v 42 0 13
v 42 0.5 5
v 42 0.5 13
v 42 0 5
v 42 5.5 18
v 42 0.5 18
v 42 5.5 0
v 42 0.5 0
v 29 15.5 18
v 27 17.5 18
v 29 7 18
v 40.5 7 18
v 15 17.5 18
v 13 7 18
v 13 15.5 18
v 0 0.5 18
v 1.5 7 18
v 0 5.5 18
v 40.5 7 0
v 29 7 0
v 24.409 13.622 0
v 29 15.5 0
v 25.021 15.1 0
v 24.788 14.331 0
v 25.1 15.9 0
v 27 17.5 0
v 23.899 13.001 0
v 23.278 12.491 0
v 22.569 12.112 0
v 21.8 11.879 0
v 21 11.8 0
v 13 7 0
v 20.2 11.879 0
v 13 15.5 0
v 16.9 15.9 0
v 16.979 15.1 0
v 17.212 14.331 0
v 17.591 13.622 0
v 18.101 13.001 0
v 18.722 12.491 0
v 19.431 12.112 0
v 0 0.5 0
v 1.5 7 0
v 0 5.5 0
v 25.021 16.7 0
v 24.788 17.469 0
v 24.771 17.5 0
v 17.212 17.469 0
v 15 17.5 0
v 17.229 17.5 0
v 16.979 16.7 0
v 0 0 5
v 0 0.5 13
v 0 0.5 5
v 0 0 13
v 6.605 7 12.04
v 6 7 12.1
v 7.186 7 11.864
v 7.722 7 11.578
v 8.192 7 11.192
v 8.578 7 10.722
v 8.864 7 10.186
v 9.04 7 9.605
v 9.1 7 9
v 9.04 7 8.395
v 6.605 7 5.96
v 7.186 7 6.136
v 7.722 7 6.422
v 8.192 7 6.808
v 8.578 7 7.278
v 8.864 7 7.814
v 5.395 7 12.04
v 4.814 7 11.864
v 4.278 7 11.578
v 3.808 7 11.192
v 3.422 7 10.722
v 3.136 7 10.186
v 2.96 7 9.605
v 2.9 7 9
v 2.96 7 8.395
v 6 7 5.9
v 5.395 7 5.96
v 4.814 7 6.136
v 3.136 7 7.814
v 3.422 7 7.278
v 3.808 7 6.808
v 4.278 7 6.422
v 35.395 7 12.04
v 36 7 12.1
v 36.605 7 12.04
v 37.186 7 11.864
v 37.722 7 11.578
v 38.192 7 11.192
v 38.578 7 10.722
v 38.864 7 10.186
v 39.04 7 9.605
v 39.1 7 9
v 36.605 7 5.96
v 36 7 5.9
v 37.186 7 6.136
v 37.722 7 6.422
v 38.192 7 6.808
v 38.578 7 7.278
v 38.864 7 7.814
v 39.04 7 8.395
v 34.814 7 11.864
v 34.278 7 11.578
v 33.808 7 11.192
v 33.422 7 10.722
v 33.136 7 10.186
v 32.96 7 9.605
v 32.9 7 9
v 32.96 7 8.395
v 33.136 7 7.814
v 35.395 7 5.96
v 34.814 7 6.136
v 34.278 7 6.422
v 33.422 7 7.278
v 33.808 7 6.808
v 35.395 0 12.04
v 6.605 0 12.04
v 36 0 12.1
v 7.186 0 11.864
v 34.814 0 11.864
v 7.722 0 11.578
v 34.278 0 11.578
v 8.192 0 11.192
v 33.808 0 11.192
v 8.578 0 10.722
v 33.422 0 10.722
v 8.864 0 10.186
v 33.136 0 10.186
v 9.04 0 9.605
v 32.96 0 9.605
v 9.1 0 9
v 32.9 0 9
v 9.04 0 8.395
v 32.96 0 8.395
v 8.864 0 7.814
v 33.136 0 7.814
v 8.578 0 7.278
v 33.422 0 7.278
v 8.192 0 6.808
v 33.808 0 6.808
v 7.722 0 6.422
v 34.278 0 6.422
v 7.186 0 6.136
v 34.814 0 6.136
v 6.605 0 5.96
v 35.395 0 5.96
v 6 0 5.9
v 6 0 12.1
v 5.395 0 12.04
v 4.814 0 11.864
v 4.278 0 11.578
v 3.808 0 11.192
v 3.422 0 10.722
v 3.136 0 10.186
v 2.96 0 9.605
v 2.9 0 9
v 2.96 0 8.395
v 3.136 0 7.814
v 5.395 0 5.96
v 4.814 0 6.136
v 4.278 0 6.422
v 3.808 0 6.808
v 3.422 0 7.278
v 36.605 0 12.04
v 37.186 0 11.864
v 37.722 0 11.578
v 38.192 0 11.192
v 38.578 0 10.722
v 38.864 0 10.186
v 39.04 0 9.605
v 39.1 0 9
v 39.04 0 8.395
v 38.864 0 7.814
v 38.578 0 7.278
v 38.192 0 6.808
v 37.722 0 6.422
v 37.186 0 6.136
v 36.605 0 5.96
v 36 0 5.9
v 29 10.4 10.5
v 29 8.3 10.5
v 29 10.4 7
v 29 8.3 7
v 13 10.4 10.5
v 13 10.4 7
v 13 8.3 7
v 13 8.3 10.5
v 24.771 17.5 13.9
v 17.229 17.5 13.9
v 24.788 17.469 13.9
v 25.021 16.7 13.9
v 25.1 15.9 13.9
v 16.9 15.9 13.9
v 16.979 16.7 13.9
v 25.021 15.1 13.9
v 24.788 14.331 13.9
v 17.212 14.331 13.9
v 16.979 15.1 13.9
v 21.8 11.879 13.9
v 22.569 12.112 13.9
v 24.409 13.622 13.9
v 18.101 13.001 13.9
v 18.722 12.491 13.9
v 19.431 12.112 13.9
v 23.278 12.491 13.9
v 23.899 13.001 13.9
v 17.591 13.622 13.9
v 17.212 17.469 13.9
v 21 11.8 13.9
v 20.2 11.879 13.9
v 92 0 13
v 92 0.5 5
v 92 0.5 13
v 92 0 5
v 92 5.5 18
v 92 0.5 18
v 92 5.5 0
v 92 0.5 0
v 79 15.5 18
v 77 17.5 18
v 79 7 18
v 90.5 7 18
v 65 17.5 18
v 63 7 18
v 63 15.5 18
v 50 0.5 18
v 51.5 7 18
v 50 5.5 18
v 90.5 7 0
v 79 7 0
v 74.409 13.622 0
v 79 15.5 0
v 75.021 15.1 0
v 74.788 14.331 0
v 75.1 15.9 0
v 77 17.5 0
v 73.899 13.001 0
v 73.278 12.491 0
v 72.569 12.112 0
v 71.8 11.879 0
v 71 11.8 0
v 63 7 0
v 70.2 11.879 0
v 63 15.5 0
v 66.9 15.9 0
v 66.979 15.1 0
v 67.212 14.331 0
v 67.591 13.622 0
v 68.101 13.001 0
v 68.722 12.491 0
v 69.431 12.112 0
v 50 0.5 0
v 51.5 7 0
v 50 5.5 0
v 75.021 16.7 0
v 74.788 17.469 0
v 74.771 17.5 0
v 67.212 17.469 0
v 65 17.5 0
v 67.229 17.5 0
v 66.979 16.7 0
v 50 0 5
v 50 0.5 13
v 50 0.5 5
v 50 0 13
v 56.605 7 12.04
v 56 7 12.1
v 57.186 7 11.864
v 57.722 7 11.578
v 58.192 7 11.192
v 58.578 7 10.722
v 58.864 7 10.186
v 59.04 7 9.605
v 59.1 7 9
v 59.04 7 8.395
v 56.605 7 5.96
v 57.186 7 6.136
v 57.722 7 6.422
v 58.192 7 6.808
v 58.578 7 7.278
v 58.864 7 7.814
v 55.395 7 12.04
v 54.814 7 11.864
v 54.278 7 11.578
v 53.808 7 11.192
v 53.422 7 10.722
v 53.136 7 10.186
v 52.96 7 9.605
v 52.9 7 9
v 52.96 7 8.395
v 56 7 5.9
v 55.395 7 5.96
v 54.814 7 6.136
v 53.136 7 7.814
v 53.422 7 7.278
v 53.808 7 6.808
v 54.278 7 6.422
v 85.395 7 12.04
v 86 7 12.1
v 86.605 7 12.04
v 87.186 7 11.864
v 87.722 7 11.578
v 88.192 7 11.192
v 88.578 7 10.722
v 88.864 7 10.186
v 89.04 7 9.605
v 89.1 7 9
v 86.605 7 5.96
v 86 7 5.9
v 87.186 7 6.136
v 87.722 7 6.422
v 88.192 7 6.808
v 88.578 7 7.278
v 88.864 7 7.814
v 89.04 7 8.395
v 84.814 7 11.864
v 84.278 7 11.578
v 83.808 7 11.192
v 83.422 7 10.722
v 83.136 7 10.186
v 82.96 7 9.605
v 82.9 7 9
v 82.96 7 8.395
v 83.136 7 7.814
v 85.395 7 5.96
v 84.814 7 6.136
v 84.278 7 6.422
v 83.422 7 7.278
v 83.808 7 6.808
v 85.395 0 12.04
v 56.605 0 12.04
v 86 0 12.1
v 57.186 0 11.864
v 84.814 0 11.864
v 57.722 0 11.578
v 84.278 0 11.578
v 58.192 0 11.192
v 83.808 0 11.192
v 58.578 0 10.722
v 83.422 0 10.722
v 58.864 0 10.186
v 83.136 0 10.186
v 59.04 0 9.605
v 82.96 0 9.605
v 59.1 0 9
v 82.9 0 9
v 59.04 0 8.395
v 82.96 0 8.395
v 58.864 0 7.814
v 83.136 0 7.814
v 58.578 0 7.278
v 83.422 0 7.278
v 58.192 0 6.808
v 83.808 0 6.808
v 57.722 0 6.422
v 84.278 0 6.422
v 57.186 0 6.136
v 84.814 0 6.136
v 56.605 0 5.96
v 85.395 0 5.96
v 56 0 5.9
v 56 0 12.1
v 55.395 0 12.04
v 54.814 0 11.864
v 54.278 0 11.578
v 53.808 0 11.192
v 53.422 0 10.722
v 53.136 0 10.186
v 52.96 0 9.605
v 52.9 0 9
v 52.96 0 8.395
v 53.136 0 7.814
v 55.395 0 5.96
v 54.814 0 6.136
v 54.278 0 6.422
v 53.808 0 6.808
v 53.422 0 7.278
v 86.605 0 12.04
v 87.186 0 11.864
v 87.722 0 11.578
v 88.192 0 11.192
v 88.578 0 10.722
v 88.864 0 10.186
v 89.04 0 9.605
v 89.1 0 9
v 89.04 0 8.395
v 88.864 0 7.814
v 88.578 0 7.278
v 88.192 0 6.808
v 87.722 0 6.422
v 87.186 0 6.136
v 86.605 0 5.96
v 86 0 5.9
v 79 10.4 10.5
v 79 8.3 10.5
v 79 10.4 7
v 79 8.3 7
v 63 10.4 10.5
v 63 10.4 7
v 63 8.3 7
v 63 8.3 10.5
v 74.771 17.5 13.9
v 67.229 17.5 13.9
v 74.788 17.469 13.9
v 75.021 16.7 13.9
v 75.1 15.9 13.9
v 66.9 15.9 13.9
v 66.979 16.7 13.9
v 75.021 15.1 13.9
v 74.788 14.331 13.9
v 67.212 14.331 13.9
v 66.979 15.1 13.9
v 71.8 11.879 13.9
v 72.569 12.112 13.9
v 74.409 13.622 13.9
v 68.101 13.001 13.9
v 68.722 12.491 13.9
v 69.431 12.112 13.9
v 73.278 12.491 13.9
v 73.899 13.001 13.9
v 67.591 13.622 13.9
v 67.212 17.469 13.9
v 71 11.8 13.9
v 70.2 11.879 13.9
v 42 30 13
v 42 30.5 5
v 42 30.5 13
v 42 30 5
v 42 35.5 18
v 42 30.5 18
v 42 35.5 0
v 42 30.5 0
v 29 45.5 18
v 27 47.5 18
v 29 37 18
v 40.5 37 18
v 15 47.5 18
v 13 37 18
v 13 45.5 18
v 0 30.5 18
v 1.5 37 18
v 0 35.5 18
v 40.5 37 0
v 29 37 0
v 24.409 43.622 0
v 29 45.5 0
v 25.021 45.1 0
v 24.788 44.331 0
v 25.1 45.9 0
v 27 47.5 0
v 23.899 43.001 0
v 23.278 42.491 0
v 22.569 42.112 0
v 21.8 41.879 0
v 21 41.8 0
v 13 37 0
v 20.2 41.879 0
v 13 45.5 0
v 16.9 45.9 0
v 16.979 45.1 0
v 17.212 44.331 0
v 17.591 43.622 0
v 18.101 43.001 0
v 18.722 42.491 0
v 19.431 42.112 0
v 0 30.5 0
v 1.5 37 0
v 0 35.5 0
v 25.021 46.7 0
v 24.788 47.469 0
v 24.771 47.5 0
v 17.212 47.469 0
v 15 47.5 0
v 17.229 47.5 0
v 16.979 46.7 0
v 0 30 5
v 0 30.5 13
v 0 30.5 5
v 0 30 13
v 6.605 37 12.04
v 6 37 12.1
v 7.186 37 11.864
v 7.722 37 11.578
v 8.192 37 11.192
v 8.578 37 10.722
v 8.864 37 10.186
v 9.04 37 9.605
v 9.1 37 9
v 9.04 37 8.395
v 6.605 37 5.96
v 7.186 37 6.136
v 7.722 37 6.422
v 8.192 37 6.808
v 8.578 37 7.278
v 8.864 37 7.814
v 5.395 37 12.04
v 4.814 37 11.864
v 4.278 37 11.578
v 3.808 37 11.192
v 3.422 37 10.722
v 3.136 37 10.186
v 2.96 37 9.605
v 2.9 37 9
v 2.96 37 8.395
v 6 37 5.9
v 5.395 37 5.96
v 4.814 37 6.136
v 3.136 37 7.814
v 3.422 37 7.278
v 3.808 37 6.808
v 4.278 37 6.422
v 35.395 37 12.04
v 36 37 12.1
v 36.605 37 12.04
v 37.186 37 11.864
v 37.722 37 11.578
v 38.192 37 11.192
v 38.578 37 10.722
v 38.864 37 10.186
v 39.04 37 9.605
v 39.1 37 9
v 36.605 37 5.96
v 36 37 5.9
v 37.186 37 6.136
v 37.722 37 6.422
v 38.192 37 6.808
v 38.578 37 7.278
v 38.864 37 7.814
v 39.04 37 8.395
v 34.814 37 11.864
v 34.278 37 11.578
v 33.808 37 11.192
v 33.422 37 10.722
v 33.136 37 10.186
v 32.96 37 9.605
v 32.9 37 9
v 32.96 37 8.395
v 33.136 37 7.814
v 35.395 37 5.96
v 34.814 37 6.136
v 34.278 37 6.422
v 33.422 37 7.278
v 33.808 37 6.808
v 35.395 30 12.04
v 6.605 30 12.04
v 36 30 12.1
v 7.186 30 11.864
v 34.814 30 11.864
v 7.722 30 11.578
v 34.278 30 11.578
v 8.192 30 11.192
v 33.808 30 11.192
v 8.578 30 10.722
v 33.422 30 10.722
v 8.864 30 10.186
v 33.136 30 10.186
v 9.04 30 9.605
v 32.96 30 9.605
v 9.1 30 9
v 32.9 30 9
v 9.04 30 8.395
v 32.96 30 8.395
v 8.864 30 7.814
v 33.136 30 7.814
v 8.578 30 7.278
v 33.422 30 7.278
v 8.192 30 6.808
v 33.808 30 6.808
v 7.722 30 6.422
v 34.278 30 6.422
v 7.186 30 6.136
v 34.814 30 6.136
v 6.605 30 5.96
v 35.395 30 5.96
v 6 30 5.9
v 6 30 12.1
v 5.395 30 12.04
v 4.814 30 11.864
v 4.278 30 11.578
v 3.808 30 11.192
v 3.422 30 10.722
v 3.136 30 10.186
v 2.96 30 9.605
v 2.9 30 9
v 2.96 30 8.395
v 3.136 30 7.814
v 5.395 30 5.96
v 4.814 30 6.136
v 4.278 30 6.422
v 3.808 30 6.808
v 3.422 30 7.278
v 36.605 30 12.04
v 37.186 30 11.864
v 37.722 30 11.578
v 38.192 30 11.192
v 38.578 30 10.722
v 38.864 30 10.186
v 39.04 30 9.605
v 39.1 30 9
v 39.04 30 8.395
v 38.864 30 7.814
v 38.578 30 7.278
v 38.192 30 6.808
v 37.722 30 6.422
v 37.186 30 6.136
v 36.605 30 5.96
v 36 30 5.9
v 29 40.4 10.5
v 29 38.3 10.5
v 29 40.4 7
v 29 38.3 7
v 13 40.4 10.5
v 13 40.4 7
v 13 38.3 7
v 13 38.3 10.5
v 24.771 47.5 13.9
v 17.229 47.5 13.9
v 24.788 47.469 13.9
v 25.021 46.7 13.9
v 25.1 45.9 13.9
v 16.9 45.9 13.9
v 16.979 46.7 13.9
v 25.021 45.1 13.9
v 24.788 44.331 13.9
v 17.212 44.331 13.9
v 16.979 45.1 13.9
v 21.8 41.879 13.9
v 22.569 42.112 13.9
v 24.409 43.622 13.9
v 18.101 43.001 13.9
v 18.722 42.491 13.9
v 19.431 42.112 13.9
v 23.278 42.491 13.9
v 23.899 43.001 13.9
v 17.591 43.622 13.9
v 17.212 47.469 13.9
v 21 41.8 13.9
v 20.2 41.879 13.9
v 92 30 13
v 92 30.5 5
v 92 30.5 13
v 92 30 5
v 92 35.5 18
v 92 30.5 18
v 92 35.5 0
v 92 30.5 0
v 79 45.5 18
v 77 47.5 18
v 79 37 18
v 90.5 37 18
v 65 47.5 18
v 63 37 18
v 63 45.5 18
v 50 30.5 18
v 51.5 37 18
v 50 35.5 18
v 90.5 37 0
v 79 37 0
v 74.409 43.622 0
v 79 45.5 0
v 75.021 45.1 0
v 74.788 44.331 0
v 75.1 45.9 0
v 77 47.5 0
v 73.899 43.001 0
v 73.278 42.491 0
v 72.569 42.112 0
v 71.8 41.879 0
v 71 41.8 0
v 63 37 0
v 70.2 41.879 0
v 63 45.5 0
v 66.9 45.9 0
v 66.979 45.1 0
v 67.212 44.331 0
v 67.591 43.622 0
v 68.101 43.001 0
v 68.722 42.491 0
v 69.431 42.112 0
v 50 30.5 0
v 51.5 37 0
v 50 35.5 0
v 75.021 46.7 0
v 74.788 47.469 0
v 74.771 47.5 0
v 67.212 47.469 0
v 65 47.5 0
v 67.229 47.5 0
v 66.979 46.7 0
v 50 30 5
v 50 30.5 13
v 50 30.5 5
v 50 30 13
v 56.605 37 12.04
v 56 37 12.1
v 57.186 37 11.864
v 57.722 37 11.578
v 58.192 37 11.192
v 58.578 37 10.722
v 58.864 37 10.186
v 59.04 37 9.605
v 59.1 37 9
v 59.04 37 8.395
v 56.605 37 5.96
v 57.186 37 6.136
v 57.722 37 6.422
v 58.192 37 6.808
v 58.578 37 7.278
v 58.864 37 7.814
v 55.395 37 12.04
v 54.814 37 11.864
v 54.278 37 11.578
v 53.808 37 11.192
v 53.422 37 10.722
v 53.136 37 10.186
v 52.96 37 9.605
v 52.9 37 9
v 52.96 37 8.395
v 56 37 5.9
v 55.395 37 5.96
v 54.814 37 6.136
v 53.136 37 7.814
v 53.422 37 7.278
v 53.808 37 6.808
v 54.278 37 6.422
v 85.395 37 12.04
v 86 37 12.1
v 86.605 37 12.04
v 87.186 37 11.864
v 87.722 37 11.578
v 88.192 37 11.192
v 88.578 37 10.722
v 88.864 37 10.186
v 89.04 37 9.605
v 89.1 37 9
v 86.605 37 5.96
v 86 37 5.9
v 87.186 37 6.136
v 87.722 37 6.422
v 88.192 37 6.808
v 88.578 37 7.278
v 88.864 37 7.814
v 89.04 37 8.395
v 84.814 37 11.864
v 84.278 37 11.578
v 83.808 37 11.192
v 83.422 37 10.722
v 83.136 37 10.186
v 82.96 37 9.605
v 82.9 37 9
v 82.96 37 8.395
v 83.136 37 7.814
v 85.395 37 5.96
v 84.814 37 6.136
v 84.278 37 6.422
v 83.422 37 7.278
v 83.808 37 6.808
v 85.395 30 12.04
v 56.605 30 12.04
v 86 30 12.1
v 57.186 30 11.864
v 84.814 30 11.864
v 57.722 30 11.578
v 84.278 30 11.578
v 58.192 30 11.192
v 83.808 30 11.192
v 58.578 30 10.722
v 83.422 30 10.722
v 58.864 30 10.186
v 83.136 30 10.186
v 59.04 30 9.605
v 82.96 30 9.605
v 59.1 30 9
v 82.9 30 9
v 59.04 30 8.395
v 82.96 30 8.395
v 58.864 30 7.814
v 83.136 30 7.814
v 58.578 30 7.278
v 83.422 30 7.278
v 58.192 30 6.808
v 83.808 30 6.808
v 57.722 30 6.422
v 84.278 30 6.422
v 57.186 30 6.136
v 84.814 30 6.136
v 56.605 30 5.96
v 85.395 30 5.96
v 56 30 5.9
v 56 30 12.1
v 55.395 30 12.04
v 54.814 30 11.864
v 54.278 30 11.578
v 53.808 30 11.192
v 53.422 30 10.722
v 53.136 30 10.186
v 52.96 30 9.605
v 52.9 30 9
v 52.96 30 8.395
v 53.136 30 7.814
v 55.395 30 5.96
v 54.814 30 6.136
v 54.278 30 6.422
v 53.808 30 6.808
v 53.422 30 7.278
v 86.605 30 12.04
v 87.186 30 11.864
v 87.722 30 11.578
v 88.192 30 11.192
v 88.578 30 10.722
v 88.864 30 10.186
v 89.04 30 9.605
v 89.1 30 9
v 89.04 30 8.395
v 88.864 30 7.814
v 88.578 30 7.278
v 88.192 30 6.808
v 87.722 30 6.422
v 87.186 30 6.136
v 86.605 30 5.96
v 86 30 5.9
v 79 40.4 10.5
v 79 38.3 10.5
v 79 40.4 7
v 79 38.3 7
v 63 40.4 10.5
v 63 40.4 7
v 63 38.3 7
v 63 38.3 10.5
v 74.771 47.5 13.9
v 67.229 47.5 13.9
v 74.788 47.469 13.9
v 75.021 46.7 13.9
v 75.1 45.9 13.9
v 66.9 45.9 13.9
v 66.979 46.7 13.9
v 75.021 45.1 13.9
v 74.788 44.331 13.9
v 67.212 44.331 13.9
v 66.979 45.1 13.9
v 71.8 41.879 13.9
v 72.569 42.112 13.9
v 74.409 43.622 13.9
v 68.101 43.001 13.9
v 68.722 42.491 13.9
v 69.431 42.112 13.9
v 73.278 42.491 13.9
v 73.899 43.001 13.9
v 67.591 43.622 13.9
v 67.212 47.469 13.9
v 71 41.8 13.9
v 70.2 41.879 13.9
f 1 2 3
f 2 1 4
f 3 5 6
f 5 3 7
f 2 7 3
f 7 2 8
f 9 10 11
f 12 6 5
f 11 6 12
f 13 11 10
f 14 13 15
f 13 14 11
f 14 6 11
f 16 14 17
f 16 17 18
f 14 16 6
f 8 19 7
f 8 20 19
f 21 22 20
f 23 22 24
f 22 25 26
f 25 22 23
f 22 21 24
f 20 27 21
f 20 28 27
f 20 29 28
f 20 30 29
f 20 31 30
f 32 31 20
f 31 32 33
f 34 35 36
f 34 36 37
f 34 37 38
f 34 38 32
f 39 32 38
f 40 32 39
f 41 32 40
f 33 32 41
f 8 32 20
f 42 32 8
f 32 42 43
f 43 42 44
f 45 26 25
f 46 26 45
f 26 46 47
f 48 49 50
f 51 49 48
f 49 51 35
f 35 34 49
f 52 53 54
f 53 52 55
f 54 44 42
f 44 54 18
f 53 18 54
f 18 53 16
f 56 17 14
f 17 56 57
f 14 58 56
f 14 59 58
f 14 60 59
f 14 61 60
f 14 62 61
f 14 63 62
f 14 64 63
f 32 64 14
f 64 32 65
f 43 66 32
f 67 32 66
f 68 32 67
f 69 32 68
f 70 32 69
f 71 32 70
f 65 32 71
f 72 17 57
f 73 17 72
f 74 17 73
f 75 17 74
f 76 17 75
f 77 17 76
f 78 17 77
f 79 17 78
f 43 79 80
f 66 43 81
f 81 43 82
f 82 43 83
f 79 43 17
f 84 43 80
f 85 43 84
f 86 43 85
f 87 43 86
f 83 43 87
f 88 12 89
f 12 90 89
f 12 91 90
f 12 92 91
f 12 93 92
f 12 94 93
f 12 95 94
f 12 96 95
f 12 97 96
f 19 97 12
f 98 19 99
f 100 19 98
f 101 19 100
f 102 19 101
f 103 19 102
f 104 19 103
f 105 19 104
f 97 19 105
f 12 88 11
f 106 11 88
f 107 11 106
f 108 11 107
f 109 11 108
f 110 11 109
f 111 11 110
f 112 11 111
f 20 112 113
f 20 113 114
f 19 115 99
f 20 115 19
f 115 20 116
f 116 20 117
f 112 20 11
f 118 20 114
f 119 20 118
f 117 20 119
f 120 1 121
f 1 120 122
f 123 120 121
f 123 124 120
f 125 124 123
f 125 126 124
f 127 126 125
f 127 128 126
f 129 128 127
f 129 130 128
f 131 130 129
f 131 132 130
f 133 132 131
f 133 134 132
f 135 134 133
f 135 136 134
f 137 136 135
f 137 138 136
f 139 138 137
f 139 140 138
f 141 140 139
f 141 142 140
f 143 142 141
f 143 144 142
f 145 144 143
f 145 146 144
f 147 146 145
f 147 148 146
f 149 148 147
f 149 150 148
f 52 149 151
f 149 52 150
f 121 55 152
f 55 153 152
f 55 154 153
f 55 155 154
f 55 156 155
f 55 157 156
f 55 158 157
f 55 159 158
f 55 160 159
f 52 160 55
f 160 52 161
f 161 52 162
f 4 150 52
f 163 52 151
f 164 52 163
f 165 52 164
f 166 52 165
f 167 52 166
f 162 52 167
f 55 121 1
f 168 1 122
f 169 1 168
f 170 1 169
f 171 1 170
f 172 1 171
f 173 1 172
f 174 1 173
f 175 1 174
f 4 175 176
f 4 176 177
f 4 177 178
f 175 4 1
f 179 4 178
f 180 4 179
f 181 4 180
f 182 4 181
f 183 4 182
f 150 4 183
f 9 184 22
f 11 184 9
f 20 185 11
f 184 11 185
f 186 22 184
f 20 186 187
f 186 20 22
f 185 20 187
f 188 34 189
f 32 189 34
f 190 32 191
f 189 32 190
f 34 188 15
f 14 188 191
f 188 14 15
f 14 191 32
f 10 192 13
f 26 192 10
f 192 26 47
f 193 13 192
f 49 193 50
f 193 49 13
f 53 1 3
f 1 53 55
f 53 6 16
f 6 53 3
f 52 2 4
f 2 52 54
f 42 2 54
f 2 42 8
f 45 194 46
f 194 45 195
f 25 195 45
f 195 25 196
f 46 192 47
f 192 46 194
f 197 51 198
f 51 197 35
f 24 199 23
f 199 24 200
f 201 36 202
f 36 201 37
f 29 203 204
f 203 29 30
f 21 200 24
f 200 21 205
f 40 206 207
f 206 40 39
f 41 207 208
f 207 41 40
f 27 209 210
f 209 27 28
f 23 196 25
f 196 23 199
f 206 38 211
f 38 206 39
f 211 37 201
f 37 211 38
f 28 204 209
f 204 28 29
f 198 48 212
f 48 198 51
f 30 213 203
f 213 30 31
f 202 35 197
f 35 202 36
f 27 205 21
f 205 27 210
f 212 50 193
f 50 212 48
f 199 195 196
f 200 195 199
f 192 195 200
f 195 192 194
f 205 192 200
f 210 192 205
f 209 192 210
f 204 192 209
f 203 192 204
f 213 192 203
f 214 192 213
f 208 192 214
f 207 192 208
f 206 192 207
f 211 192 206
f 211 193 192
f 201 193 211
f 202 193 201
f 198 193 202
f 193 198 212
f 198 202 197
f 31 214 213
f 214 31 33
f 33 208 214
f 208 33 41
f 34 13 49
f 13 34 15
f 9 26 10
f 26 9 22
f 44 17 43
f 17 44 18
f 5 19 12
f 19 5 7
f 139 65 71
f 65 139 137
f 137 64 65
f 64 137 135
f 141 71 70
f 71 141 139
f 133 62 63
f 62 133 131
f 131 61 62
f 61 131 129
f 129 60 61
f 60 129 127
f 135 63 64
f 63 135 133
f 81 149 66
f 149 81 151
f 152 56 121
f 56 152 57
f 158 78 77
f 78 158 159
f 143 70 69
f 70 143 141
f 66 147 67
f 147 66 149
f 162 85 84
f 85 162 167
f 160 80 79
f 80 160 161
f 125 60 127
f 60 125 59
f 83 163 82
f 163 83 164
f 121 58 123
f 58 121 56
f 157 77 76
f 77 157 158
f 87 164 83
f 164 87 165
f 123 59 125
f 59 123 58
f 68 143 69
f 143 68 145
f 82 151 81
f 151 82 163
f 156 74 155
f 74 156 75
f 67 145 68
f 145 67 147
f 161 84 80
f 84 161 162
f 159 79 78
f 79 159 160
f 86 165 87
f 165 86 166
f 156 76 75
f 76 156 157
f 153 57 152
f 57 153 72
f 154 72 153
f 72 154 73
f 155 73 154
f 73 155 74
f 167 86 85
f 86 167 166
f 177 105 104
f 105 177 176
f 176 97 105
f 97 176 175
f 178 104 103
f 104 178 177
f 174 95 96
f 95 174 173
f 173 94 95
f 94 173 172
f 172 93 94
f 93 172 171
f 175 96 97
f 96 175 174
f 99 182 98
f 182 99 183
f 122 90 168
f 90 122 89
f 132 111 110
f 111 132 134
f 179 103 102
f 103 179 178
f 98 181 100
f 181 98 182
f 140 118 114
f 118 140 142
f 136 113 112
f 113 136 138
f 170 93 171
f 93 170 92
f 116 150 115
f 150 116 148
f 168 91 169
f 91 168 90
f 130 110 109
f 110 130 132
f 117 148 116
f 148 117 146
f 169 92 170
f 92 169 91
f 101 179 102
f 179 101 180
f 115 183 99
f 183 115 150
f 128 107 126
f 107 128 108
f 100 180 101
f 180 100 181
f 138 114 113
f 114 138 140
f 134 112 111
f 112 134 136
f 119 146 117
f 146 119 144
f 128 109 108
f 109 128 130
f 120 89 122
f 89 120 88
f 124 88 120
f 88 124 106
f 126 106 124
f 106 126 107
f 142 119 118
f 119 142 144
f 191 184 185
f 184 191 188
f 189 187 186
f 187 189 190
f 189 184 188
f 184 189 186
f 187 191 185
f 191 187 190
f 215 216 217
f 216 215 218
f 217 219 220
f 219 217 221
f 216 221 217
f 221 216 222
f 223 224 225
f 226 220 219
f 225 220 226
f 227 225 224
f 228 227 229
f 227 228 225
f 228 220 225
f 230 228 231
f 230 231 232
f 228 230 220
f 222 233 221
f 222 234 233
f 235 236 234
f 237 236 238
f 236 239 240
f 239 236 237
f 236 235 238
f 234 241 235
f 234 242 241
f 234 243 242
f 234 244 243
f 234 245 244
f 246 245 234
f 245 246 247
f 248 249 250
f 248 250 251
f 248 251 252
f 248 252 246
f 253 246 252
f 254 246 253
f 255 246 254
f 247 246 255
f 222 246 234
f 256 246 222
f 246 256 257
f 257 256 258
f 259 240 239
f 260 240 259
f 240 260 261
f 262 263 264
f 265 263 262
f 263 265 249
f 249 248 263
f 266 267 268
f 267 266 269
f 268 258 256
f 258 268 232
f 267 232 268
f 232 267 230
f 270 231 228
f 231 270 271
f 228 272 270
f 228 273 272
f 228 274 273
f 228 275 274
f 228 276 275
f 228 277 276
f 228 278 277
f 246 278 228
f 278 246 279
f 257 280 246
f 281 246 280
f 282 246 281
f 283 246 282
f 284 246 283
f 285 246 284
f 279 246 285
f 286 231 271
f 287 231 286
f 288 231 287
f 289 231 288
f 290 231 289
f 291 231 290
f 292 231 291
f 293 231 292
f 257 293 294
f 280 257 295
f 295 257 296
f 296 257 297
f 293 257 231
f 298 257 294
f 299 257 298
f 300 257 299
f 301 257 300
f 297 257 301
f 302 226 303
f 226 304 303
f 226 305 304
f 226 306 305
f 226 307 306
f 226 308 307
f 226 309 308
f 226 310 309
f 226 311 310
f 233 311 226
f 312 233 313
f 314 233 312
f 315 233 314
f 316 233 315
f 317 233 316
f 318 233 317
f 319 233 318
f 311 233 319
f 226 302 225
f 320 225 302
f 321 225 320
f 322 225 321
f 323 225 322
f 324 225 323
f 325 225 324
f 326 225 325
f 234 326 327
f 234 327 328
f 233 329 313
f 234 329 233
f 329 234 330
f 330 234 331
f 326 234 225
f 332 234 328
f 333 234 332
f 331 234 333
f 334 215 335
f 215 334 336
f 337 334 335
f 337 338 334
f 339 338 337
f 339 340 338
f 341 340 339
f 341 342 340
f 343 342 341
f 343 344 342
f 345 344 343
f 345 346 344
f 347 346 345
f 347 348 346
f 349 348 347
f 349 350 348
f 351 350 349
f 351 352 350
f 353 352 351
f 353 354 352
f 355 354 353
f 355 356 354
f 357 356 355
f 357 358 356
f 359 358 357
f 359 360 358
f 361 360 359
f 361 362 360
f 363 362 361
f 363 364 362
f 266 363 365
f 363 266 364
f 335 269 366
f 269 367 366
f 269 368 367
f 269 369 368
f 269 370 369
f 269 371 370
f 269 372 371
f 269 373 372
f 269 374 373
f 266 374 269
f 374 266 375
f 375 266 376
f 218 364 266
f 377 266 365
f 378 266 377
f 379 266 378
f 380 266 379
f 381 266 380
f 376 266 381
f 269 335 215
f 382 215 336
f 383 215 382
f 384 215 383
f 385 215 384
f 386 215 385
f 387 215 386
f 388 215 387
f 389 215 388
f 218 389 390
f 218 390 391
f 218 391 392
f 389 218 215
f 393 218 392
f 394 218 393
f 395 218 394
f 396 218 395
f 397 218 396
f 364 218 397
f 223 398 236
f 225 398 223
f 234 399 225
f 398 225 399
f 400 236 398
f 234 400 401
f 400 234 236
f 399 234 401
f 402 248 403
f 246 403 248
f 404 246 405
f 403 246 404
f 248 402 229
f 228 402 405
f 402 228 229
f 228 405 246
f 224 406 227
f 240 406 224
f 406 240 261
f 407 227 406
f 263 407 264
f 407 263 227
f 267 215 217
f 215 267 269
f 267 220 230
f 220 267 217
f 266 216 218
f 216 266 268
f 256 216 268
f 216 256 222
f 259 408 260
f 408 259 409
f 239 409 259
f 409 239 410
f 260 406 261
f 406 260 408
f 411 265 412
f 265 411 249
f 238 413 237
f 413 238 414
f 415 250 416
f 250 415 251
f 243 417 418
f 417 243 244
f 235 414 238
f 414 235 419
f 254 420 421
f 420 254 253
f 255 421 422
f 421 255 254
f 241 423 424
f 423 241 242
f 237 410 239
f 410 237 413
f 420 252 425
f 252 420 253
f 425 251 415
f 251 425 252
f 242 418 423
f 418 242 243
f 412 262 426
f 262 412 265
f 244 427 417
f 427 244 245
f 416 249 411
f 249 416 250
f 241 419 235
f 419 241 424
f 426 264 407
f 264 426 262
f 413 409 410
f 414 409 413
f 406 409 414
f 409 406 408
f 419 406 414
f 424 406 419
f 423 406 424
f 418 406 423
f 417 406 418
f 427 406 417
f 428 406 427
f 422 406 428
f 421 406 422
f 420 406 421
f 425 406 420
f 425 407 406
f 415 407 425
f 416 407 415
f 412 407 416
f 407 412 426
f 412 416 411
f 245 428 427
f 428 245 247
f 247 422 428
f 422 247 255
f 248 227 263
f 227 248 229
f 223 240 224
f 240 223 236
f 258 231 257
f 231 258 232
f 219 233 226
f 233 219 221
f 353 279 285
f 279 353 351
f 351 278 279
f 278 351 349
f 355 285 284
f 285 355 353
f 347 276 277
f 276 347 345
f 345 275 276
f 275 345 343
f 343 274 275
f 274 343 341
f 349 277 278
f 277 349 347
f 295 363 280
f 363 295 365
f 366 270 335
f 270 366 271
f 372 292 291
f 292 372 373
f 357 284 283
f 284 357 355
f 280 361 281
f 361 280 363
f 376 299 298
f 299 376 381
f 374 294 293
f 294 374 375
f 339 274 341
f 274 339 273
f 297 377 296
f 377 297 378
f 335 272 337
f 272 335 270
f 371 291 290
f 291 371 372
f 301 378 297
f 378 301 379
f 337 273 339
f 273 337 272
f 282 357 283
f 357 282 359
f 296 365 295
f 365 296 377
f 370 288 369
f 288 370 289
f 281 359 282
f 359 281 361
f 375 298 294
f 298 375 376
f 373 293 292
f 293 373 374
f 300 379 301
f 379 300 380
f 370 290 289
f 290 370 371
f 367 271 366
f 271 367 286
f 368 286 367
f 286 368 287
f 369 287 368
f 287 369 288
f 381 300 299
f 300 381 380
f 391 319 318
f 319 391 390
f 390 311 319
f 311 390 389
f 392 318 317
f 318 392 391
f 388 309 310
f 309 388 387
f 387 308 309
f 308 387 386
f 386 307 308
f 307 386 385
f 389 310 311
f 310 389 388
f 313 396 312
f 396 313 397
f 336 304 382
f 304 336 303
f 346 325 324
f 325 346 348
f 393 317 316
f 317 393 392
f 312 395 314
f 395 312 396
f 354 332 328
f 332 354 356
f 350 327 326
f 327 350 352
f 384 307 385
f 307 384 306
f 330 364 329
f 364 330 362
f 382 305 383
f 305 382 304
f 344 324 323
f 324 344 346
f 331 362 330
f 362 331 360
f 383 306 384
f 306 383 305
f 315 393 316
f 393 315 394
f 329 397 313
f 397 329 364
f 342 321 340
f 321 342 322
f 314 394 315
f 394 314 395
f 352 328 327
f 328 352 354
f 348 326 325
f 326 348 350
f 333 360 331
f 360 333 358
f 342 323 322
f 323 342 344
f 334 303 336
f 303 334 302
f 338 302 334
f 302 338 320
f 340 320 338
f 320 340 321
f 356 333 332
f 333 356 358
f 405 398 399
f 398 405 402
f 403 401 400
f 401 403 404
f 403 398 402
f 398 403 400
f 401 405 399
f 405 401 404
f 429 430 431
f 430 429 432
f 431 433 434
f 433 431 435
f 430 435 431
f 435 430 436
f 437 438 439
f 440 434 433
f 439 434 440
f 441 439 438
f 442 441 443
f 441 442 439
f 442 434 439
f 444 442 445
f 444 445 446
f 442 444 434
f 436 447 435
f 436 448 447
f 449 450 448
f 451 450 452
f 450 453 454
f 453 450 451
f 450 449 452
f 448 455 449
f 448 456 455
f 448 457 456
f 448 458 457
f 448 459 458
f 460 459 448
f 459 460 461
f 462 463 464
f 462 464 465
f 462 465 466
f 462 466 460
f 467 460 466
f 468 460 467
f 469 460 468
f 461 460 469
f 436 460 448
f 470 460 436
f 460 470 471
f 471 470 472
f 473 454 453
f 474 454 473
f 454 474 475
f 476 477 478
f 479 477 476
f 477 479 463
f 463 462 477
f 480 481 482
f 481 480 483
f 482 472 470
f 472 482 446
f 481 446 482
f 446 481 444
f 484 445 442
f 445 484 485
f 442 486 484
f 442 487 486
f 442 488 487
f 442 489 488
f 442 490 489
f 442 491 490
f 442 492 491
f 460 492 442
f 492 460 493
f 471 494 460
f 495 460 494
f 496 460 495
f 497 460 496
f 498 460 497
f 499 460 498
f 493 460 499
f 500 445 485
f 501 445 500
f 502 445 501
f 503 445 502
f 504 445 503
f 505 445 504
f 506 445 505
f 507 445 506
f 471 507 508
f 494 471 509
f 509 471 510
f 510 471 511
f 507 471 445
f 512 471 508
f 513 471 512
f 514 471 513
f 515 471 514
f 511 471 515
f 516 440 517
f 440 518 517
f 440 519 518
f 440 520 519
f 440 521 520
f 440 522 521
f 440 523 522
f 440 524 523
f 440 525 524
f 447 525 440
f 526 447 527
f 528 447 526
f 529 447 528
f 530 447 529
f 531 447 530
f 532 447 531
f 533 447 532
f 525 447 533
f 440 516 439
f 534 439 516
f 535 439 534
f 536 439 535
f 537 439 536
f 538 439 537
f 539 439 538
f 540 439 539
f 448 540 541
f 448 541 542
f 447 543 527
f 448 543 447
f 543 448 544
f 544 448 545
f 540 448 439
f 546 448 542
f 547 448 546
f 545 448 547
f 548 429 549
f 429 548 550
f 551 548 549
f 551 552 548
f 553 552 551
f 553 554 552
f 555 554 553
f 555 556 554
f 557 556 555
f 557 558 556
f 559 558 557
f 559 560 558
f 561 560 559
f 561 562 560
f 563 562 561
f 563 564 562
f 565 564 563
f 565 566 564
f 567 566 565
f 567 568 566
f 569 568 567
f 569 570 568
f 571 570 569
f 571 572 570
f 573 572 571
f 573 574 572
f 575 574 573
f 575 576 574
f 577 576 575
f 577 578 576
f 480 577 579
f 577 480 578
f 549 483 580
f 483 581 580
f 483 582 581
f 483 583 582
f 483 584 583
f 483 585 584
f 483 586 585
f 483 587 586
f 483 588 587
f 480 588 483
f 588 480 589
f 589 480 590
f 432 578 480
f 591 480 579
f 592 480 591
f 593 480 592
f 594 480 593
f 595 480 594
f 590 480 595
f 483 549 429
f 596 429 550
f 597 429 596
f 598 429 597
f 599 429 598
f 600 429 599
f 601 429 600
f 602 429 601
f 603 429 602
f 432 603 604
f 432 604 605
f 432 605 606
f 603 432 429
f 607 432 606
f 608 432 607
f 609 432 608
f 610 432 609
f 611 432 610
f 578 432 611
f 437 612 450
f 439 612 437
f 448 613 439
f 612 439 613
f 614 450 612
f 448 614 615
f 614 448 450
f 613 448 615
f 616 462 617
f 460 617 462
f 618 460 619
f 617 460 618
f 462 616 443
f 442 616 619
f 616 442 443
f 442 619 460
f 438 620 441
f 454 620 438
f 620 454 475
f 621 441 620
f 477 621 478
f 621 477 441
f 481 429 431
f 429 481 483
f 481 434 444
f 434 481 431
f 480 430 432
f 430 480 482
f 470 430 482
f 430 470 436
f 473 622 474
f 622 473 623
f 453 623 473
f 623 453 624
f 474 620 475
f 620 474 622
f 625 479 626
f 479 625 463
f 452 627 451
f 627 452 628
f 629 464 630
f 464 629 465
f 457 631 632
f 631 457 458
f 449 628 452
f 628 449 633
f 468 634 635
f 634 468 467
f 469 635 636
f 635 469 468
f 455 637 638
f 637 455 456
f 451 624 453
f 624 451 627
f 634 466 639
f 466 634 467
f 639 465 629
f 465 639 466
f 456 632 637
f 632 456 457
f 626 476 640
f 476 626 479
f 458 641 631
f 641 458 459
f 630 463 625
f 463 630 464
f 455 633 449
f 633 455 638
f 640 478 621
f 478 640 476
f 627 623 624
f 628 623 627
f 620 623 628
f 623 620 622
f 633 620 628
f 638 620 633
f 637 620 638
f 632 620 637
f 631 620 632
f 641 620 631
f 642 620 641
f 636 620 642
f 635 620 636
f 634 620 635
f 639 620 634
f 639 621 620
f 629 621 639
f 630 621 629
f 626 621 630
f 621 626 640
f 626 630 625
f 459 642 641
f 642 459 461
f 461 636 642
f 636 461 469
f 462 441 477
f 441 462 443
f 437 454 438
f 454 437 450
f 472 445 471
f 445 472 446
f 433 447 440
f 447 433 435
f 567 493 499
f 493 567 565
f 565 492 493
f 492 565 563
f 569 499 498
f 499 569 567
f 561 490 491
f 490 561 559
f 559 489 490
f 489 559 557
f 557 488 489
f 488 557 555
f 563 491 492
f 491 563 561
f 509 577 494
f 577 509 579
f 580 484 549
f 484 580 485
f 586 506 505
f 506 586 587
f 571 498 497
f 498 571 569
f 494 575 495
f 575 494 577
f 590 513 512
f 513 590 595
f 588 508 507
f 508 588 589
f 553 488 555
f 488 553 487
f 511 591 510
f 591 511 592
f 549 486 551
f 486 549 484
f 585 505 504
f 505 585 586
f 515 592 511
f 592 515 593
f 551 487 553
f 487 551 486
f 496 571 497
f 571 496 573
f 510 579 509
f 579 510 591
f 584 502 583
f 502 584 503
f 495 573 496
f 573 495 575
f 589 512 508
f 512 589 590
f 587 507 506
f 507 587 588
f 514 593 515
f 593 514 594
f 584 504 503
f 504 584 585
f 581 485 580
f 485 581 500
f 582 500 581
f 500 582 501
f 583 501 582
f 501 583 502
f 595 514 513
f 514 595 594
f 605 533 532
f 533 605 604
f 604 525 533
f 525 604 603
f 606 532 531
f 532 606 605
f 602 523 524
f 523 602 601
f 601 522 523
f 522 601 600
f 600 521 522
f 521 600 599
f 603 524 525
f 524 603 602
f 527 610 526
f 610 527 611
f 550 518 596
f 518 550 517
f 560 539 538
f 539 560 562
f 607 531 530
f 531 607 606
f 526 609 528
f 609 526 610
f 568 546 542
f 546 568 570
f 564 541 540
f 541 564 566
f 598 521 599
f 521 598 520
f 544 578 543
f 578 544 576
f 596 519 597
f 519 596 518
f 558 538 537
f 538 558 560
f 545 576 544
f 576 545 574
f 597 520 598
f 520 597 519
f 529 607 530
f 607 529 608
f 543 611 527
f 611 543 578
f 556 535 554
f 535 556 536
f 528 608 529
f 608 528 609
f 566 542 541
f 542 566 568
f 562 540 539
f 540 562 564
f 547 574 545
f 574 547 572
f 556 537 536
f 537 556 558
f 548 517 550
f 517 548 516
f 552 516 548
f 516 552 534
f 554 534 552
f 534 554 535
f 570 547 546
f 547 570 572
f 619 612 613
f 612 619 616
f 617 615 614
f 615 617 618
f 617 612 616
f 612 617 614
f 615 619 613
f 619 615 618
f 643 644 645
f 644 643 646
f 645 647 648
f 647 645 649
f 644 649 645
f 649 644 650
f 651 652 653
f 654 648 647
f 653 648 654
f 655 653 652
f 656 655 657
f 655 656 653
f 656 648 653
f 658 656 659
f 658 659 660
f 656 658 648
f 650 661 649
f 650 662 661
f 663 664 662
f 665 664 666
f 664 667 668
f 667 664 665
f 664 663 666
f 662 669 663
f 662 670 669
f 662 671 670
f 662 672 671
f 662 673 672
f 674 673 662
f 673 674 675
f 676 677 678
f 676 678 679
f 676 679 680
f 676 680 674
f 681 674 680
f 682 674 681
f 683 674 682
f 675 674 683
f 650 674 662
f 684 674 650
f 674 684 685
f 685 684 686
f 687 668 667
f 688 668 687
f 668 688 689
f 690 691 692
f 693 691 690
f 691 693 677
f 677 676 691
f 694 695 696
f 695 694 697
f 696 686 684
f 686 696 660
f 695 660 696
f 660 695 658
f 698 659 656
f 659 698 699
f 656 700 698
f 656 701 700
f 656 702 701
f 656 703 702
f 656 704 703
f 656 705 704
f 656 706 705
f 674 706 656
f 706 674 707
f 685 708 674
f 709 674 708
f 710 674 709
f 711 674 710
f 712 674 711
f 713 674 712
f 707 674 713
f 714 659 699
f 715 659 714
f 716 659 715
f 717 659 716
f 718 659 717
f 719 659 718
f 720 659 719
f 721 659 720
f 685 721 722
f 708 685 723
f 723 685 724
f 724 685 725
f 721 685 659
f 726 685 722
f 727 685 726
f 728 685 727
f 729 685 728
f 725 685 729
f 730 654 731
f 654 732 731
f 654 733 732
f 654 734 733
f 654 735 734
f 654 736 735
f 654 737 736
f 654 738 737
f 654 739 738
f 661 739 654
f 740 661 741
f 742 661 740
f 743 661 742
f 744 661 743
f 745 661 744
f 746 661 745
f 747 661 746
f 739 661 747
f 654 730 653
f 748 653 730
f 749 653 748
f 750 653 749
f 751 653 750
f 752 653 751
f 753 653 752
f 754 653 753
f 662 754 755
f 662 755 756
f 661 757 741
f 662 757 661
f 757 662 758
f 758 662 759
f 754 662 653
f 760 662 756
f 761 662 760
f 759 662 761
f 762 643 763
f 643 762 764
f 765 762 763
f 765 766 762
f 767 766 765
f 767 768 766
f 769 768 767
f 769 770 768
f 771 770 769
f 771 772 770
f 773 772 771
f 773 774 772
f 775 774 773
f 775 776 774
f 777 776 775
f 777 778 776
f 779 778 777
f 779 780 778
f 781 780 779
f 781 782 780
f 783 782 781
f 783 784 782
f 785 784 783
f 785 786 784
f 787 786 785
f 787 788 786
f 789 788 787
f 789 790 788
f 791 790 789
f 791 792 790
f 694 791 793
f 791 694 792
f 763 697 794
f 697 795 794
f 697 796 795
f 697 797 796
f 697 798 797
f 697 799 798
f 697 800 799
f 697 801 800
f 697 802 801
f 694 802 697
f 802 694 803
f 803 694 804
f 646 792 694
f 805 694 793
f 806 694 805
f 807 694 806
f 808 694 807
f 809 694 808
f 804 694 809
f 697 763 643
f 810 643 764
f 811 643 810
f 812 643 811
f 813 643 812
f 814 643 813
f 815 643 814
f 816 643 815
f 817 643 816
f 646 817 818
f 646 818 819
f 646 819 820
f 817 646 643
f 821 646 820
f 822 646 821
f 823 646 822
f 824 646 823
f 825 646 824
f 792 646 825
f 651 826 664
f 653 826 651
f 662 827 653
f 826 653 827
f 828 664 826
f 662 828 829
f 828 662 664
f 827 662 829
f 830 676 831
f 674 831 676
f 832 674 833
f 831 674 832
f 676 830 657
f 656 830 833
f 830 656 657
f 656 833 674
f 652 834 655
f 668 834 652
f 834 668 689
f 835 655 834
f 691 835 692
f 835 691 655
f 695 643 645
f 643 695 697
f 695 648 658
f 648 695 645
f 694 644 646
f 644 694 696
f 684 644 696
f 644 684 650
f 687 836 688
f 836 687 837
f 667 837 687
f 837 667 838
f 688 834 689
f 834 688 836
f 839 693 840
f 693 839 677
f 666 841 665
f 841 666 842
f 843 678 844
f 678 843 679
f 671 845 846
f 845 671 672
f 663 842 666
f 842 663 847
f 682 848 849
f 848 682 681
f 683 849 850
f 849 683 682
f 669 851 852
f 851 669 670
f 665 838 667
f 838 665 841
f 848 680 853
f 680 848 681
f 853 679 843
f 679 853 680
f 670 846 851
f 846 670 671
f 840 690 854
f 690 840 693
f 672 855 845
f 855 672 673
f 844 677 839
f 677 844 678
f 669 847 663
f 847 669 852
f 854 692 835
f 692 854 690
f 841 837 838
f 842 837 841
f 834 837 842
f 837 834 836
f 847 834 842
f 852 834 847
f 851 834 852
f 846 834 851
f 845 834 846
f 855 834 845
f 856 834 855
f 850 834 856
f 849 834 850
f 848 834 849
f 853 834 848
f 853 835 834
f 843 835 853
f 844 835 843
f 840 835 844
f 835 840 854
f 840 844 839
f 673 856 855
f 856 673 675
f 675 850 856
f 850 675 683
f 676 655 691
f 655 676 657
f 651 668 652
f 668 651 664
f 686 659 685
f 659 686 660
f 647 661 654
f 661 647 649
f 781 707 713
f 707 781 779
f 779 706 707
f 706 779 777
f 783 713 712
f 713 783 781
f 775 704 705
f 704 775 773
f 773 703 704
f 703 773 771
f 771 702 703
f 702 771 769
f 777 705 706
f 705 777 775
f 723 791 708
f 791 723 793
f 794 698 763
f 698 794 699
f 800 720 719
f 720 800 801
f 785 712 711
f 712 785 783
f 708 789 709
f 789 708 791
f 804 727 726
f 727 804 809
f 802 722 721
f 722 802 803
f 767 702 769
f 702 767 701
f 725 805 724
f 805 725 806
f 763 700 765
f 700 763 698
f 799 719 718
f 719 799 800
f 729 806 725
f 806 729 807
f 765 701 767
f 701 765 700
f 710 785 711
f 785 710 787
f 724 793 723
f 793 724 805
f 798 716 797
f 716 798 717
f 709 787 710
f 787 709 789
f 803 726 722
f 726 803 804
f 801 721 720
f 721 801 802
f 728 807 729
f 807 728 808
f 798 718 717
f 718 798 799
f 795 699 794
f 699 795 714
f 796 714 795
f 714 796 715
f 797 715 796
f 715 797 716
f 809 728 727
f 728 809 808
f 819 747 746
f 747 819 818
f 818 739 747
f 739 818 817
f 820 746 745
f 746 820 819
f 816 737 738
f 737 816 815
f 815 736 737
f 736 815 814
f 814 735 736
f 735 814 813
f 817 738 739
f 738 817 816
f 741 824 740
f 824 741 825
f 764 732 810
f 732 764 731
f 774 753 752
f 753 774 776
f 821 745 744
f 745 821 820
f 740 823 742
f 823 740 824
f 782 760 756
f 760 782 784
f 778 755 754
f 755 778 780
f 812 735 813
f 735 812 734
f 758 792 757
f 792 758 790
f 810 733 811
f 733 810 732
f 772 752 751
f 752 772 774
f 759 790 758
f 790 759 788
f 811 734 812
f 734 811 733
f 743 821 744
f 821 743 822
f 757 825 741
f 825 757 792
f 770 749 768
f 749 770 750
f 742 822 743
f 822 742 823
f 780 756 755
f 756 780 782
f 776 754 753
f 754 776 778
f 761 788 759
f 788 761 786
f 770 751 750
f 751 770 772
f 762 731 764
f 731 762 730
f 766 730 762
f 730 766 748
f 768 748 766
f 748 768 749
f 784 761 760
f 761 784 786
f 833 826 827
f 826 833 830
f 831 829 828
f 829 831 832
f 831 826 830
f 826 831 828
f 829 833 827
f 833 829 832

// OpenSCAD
// RebeliX
//
// y rod holder
// GNU GPL v3
// Martin Neruda <neruda@reprap4u.cz>
// http://www.reprap4u.cz

width = 42;
height = 18;
base_thickness = 7;
thickness = 17.5;
rod_diameter = 8;


module y_rod_holder_base(){
  cube([width,base_thickness,height]);
  translate([width/2-8,0,0]) cube([16,thickness,height]);
}

module y_cuts(){
  // Vyrez pro kombistojku
  translate([width+0.1,0.5,(height/2)+4]) rotate([0,0,180]) cube([50,2,10]);
  translate([width+0.1,0.5,0]) rotate([0,0,180]) cube([50,2,(height/2)-4]);
  
  // Vyrez pro 8mm tyc
  translate([width/2,thickness - 1.6,-0.1]) cylinder(h=(height/2)+5,r=(rod_diameter/2)+0.1,$fn = 32);
  // Zkosene hrany
  translate([width/2-8,thickness-2,-0.1]) rotate([0,0,45]) cube([10,10,20]);
  translate([width/2+8,thickness-2,-0.1]) rotate([0,0,45]) cube([10,10,20]);
  
  translate([0,base_thickness-1.5,-0.1]) rotate([0,0,45]) cube([10,10,20]);
  translate([width,base_thickness-1.5,-0.1]) rotate([0,0,45]) cube([10,10,20]);
  // Otvory pro M6 srouby
  translate([6,-0.1,height/2]) rotate([-90,0,0]) cylinder(h=10,r=3.1,$fn = 32);
  translate([width-6,-0.1,height/2]) rotate([-90,0,0]) cylinder(h=10,r=3.1,$fn = 32);
  // Otvor pro zip pasku
  translate([5,base_thickness + 1.3,(height/2)-2])  cube([30,2.1,3.5]);
}

difference(){
	y_rod_holder_base();
	y_cuts();
}	

translate([50, 0]) difference(){
	y_rod_holder_base();
	y_cuts();
}	

translate([0, 30]) difference(){
	y_rod_holder_base();
	y_cuts();
}	

translate([50, 30]) difference(){
	y_rod_holder_base();
	y_cuts();
}	
